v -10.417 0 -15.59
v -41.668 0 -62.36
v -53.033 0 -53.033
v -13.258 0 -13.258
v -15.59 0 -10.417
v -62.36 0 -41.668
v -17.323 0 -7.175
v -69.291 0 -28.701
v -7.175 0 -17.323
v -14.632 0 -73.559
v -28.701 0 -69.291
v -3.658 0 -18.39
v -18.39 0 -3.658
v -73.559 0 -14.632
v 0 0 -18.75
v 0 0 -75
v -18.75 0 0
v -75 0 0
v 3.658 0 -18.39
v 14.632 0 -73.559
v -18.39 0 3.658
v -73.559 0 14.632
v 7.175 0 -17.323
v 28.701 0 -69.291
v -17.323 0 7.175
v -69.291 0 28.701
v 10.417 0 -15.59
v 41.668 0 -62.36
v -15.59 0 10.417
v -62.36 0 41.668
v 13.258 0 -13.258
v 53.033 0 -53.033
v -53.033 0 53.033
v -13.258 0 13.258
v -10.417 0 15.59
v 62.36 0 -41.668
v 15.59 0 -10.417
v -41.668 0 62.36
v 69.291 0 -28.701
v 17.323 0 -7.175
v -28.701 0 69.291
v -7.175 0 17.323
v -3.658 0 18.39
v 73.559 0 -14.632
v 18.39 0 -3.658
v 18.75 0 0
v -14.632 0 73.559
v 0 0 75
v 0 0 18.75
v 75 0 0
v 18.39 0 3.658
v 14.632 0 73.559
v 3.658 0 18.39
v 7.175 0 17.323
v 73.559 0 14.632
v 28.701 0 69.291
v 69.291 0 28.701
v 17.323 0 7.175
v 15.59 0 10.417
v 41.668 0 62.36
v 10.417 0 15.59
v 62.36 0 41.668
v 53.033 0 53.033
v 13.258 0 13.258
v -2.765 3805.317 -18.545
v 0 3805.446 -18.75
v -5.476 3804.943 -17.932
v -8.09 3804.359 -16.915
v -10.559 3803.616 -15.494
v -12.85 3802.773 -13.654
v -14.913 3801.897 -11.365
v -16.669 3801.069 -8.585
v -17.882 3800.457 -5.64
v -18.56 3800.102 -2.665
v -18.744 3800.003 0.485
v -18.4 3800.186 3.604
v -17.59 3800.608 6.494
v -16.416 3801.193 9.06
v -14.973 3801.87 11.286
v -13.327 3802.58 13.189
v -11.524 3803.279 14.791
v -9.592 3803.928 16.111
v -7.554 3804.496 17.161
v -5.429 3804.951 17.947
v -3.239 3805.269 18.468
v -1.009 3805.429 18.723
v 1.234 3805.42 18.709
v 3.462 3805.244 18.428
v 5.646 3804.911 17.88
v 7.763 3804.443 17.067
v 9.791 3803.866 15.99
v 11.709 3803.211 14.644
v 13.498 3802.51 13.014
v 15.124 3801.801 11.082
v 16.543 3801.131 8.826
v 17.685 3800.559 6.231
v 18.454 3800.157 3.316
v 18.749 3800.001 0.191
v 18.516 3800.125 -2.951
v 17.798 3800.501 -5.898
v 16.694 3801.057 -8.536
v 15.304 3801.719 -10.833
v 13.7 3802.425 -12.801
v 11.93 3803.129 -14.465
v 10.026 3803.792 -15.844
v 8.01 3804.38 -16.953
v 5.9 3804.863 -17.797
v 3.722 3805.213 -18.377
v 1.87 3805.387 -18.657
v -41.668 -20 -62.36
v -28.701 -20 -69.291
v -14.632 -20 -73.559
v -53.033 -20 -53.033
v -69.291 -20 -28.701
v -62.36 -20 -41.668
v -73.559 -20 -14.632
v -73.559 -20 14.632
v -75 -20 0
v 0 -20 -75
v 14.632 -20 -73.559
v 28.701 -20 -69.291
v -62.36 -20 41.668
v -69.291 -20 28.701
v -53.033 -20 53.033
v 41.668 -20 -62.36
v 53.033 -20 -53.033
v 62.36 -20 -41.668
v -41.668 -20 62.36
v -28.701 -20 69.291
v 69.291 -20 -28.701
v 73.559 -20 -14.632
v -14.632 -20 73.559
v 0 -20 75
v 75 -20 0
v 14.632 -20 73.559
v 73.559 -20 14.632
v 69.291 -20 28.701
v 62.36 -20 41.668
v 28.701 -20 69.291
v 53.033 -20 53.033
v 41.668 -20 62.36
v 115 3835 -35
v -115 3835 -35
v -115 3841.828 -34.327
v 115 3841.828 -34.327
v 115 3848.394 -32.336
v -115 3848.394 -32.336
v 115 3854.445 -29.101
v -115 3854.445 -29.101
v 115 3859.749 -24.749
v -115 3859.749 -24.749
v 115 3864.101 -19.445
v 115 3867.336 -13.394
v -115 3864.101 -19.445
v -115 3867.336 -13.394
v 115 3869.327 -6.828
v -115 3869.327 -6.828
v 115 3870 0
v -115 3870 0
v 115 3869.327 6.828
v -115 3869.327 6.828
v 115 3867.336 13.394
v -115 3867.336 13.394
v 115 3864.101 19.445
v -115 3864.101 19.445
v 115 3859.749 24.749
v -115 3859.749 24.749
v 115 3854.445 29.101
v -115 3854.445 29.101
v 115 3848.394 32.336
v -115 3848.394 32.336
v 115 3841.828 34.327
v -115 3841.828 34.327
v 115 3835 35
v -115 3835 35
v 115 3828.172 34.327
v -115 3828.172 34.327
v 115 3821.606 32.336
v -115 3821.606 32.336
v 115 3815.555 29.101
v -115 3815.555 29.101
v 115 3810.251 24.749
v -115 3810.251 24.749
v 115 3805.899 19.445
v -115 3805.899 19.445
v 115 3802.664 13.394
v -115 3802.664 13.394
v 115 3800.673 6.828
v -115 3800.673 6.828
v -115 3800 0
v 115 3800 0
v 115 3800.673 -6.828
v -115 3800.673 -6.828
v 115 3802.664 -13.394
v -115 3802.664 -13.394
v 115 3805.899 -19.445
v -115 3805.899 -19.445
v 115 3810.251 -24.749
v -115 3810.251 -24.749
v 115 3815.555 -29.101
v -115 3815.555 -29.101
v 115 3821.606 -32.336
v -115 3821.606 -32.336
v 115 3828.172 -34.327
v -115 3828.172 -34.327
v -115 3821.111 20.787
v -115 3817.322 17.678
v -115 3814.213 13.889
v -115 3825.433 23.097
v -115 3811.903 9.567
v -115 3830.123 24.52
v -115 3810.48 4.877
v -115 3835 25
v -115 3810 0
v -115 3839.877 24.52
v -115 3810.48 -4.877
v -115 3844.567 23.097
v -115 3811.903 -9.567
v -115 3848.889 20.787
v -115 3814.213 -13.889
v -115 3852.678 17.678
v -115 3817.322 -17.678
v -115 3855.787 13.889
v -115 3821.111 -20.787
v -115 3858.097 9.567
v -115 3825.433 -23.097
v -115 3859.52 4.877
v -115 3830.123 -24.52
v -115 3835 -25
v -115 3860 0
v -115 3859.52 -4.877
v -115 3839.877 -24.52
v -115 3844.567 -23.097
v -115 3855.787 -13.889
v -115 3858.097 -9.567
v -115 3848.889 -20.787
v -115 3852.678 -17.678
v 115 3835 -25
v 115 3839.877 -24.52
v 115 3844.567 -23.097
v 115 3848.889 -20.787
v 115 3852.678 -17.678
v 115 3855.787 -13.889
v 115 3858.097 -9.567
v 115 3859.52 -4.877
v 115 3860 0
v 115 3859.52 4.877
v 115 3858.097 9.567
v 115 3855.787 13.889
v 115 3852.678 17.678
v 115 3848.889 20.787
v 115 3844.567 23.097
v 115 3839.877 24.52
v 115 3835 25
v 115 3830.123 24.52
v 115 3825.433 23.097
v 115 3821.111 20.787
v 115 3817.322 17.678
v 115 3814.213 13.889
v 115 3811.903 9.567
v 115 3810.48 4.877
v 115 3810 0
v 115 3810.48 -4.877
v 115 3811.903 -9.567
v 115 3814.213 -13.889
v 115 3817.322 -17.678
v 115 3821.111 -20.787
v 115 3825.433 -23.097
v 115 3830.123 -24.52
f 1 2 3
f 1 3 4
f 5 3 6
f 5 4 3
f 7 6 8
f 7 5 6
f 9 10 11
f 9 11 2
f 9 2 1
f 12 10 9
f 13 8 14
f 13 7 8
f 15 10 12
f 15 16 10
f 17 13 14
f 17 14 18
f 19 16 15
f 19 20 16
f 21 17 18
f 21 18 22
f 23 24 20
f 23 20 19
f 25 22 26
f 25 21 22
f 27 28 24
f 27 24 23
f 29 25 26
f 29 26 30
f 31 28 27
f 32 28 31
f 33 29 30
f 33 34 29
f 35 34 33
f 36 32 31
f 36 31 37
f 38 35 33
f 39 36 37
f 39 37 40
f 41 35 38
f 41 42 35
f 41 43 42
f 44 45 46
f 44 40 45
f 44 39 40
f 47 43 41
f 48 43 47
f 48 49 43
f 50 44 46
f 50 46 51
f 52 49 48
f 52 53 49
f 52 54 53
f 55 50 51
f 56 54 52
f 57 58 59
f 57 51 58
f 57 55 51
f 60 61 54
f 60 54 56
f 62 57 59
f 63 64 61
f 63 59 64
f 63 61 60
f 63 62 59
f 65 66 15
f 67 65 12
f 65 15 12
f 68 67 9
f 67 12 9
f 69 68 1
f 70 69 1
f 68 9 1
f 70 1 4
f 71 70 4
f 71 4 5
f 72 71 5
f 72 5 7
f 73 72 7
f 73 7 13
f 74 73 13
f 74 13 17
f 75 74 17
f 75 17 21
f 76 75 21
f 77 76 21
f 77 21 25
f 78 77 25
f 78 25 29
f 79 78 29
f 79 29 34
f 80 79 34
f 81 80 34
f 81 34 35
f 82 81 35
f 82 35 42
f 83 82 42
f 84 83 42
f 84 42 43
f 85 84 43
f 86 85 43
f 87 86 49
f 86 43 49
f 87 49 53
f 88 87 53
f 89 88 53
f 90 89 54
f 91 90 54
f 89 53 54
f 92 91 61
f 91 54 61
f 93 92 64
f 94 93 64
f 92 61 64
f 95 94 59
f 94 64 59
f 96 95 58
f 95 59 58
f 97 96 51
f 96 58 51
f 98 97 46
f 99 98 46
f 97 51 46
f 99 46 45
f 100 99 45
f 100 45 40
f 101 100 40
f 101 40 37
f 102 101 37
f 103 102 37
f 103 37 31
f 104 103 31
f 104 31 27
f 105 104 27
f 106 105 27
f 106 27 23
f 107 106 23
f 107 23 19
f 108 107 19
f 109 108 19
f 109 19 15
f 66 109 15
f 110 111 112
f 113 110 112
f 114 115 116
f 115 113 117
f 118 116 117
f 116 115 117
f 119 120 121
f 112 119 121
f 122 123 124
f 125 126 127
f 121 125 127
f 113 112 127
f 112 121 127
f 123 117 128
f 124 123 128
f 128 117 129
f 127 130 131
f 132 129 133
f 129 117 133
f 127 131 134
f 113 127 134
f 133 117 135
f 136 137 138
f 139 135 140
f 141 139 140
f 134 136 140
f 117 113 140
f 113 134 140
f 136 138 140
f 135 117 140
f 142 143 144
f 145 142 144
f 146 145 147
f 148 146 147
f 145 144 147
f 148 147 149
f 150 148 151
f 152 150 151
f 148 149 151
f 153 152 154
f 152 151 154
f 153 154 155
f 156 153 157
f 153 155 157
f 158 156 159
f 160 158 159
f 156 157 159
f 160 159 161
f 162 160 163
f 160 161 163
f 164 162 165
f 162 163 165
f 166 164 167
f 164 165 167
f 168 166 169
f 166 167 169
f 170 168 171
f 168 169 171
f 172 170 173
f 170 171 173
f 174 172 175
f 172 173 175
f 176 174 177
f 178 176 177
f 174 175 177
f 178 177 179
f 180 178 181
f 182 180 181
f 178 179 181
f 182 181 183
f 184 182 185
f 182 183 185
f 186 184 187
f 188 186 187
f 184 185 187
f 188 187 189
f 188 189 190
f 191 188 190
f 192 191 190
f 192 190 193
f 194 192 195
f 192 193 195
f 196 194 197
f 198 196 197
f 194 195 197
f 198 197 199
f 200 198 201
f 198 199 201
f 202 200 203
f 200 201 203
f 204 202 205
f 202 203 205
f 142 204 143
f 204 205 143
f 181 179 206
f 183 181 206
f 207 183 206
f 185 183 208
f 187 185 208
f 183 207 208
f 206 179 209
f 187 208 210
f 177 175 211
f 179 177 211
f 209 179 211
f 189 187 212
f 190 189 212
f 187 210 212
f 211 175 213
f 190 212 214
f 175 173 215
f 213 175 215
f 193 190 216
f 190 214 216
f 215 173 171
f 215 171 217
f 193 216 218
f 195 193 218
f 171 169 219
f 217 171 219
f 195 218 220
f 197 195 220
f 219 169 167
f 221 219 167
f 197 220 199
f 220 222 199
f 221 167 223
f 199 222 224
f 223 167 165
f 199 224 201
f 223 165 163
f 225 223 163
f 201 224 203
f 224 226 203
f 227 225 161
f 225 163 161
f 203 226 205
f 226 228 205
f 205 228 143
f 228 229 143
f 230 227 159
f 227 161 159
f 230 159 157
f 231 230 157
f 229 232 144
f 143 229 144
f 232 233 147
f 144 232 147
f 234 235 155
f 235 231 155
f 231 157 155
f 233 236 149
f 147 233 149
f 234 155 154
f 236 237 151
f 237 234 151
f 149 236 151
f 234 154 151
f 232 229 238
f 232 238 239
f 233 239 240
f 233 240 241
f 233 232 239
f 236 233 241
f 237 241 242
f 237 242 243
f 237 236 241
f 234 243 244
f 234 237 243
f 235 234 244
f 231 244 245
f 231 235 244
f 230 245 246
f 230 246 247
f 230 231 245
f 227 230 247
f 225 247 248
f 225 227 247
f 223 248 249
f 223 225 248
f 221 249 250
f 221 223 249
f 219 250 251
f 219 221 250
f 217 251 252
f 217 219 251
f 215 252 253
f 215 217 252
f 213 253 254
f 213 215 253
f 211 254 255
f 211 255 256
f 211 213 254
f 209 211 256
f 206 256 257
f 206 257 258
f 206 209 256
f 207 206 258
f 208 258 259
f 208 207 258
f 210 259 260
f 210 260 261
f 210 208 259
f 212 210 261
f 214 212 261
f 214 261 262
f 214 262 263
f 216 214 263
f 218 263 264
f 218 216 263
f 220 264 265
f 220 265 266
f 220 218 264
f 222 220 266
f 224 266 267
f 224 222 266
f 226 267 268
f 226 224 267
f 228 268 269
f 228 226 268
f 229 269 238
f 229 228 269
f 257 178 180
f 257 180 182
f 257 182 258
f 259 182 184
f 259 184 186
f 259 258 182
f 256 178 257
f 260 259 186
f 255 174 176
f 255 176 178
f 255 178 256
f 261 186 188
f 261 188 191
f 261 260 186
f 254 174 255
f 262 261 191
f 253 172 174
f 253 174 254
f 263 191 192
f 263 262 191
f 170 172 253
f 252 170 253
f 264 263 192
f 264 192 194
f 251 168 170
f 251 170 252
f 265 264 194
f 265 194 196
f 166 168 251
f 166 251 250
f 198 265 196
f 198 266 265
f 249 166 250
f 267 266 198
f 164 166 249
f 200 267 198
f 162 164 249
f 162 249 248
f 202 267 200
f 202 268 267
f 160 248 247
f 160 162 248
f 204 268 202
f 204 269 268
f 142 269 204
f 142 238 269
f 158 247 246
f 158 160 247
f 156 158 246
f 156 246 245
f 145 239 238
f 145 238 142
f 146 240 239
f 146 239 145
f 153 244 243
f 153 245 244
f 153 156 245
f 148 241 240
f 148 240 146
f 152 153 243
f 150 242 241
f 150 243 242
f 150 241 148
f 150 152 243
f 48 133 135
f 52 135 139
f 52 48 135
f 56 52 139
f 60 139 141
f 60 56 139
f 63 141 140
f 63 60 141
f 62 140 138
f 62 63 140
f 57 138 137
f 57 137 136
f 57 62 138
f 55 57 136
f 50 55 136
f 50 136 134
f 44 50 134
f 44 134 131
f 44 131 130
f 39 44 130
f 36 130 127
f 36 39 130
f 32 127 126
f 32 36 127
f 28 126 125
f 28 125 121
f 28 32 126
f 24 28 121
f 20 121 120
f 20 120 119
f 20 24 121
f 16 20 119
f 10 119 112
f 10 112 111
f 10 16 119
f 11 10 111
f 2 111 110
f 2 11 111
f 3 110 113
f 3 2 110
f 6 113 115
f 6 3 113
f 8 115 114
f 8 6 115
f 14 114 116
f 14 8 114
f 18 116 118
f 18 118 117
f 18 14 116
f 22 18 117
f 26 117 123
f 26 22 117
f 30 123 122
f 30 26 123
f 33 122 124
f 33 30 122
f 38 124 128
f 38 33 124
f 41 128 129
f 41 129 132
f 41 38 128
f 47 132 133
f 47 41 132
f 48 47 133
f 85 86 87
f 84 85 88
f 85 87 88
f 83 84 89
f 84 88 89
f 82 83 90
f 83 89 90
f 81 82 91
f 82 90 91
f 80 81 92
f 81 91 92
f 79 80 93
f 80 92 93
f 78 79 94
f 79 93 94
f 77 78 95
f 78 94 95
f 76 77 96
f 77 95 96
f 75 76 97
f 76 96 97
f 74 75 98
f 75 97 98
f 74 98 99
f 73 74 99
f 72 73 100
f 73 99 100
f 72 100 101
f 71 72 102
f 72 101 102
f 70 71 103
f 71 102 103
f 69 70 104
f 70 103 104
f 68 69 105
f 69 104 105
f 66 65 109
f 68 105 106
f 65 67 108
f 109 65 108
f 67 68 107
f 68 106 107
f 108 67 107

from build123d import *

# Parameters (mm, degrees)
KLIP_SKETCH1_R                = 75
KLIP_BOSS_EXTRUDE1_DEPTH      = 20
KLIP_BOSS_EXTRUDE3_DEPTH      = 115
KLIP_BOSS_EXTRUDE3_DEPTH_BACK = 115
KLIP_SKETCH3_R                = 35
KLIP_SKETCH3_R_2              = 25
KLIP_BOSS_EXTRUDE2_REACH      = 3874.435
KLIP_BOSS_EXTRUDE2_END_RADIUS = 35
KLIP_SKETCH2_R                = 18.75


with BuildPart() as part:
    # klip_Sketch1 → klip_Boss-Extrude1 (new body)
    with BuildSketch(Plane(origin=(0, 0, 0), x_dir=(1, 0, 0), z_dir=(0, 1, 0))):
        Circle(KLIP_SKETCH1_R)
    extrude(amount=-KLIP_BOSS_EXTRUDE1_DEPTH)

    # klip_Boss-Extrude2: up to this cylinder (the profile starts outside it)
    klip_boss_extrude2_end = Plane(origin=(0, 3835, 0), z_dir=(1, 0, 0)) * Cylinder(KLIP_BOSS_EXTRUDE2_END_RADIUS, 7819.87, mode=Mode.PRIVATE)
    # klip_Sketch2 → klip_Boss-Extrude2 (add, up to the surface)
    with BuildSketch(Plane(origin=(0, 0, 0), x_dir=(1, 0, 0), z_dir=(0, 1, 0)), mode=Mode.PRIVATE) as klip_boss_extrude2_sk1:
        Circle(KLIP_SKETCH2_R)
    klip_boss_extrude2_tool1 = extrude(klip_boss_extrude2_sk1.sketch, amount=KLIP_BOSS_EXTRUDE2_REACH, mode=Mode.PRIVATE) - klip_boss_extrude2_end
    add(klip_boss_extrude2_tool1.solids().sort_by_distance((0, 0, 0))[0])


with BuildPart() as body_2:
    # klip_Sketch3 → klip_Boss-Extrude3 (new, two sides: drawn at the far end of the back side and taken through both)
    with BuildSketch(Plane(origin=(0, 0, 0), x_dir=(0, 0, -1), z_dir=(1, 0, 0)).offset(-KLIP_BOSS_EXTRUDE3_DEPTH_BACK)):
        with Locations((0, 3835)):
            Circle(KLIP_SKETCH3_R)
        with Locations((0, 3835)):
            Circle(KLIP_SKETCH3_R_2, mode=Mode.SUBTRACT)
    extrude(amount=KLIP_BOSS_EXTRUDE3_DEPTH + KLIP_BOSS_EXTRUDE3_DEPTH_BACK)


solid = Compound([part.part, body_2.part])
